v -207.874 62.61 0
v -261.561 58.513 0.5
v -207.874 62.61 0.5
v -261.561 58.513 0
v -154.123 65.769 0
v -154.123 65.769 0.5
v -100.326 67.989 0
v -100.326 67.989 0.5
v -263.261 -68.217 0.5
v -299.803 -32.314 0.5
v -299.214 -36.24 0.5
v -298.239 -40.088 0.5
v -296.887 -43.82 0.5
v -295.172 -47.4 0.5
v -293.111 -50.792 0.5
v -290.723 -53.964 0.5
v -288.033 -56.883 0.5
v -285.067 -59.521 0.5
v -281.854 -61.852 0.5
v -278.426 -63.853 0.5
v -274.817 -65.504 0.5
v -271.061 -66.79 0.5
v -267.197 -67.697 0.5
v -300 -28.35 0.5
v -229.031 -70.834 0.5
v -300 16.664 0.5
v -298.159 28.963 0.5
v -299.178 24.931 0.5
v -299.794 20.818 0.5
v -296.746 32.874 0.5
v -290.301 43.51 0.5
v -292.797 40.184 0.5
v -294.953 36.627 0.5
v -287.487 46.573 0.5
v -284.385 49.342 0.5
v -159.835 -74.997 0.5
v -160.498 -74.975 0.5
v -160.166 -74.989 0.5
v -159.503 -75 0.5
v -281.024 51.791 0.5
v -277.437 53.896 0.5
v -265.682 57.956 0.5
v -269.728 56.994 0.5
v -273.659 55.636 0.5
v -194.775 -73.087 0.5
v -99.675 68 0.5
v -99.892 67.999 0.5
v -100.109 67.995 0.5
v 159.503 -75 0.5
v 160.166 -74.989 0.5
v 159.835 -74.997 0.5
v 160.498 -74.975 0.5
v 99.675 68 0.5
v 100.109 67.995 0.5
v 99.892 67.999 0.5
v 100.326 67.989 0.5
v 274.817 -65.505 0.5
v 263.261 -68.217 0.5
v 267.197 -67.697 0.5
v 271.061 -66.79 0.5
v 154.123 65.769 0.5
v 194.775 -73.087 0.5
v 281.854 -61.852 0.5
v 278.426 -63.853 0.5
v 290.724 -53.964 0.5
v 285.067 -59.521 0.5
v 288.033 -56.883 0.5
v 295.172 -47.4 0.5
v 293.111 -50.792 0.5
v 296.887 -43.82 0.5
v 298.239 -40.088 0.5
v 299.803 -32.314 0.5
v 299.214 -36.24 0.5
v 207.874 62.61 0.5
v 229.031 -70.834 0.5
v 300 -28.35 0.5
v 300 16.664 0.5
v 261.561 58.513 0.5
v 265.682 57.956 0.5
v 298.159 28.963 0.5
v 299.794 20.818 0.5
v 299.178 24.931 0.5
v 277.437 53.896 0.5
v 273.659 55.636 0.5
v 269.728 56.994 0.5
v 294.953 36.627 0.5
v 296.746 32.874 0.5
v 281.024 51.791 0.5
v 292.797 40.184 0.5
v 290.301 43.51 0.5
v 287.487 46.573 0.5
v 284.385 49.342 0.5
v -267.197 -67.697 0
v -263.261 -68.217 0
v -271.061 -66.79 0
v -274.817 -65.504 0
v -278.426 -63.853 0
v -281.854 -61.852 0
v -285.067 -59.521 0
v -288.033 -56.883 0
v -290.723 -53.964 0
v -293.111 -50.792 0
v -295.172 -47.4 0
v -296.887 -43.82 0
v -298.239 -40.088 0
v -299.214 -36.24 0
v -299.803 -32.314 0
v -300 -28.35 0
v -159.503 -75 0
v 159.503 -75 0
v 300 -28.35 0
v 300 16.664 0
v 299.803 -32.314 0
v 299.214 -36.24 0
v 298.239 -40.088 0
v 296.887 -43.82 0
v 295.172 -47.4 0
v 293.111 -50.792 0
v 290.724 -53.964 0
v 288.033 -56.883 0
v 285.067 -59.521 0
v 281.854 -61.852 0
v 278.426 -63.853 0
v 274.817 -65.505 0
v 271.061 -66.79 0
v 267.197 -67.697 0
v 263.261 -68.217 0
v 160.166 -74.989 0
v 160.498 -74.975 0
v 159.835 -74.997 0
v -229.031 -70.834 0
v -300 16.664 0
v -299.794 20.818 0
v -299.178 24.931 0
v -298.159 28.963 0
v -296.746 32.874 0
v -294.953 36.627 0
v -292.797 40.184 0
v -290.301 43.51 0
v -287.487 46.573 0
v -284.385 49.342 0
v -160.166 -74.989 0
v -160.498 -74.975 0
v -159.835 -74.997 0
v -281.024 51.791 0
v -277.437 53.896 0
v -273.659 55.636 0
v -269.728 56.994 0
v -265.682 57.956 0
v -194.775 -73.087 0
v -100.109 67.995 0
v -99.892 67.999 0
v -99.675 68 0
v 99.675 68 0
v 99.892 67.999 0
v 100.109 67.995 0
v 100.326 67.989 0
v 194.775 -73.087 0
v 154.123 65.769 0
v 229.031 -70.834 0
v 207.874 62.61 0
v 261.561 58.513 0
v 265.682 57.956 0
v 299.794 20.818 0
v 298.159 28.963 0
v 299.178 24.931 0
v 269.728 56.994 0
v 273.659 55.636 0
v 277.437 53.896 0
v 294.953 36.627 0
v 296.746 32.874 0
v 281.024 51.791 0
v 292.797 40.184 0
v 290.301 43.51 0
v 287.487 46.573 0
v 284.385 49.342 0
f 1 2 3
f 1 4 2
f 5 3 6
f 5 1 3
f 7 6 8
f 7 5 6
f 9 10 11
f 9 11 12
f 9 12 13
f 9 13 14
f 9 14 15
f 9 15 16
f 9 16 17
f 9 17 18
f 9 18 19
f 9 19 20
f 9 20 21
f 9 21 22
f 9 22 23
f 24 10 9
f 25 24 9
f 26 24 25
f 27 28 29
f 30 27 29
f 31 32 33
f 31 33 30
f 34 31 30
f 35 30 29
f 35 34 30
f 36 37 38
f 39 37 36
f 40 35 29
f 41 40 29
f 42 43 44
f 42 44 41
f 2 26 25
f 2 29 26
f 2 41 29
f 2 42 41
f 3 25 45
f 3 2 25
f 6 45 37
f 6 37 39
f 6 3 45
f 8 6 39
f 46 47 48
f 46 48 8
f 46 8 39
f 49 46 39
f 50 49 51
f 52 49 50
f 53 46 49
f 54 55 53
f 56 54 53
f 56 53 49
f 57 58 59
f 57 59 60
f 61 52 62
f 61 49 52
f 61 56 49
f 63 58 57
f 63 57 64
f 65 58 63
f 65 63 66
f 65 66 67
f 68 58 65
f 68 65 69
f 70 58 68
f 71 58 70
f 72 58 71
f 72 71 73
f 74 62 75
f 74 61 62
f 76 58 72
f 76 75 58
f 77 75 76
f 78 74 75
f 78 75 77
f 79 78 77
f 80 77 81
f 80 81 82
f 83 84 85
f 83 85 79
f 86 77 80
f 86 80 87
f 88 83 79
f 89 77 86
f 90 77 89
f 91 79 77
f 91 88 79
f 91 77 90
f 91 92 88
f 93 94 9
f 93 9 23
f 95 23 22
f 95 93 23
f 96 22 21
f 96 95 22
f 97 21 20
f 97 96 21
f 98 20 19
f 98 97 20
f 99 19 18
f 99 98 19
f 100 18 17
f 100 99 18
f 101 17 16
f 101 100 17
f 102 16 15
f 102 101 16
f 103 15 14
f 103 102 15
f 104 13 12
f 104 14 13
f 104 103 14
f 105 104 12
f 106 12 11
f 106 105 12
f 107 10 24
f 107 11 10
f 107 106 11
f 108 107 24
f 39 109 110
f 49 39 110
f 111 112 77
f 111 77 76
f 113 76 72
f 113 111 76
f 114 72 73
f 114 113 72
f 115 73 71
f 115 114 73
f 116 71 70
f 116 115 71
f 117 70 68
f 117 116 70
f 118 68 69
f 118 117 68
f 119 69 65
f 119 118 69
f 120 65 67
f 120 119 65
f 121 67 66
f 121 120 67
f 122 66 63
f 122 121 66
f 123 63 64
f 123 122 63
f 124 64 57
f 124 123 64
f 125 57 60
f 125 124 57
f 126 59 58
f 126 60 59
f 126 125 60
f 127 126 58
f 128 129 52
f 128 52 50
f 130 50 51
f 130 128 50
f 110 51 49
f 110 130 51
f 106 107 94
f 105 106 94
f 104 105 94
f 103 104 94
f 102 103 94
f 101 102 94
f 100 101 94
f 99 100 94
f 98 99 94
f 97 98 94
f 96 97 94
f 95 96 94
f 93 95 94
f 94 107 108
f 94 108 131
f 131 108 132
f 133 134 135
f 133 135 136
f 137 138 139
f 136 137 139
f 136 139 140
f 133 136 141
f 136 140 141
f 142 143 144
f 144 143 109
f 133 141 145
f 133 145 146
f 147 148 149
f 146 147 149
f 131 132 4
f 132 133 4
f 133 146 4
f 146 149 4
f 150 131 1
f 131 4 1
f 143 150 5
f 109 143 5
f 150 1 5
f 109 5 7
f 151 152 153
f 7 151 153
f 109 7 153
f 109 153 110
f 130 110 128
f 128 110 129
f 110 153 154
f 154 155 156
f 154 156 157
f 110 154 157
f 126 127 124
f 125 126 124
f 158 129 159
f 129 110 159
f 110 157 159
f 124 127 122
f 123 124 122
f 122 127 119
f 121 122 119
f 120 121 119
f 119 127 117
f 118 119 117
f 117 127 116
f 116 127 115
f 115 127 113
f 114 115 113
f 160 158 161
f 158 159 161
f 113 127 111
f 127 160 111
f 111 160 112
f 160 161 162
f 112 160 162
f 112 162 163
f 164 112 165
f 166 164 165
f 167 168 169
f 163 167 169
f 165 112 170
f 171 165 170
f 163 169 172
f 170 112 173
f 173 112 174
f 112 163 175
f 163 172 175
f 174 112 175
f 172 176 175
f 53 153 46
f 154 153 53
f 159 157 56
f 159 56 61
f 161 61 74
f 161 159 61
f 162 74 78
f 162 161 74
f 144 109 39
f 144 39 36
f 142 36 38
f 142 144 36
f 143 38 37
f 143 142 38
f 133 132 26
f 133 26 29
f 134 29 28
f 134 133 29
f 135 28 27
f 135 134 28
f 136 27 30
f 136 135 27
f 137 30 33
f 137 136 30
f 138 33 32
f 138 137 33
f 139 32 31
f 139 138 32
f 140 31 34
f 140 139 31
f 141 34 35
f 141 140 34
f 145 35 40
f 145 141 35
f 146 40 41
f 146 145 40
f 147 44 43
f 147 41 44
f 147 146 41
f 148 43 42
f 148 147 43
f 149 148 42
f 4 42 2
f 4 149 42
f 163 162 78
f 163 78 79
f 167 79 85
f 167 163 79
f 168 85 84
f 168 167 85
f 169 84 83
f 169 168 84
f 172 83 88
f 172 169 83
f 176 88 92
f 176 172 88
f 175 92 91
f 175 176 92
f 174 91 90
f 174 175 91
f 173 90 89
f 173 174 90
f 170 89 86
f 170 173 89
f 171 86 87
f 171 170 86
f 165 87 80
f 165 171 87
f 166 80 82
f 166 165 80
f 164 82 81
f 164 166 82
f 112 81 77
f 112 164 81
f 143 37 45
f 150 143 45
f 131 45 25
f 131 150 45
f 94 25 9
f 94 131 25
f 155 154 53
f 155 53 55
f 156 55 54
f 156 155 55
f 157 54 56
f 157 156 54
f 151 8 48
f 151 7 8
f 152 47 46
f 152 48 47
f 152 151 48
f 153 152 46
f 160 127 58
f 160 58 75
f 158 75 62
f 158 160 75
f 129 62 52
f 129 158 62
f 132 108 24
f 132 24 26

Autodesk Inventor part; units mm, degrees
ref_plane "YZ Plane" through (0, 0, 0) normal (1, 0, 0) x (0, 1, 0)
ref_plane "XZ Plane" through (0, 0, 0) normal (0, 1, 0) x (-1, 0, 0)
ref_plane "XY Plane" through (0, 0, 0) normal (0, 0, 1) x (1, 0, 0)
sketch "Clock Front Face Outline" plane through (0, 0, 0) normal (0, 0, 1) x (1, 0, 0)
  arc A0 (261.5609, 58.5131) -> (100.3256, 67.9894) centre (0, -3015.4231) ccw
  arc A1 (-100.3256, 67.9894) -> (-261.5609, 58.5131) centre (0, -3015.4231) ccw
  line L0 (-159.5034, -75) -> (159.5034, -75)
  arc A2 (-263.2612, -68.2167) -> (-160.4975, -74.9753) centre (0, 3150) ccw
  arc A3 (160.4975, -74.9753) -> (263.2612, -68.2167) centre (0, 3150) ccw
  arc A4 (300, 16.6643) -> (261.5609, 58.5131) centre (258, 16.6643) ccw
  arc A5 (263.2612, -68.2167) -> (300, -28.3498) centre (260, -28.3498) ccw
  arc A6 (-300, -28.3498) -> (-263.2612, -68.2167) centre (-260, -28.3498) ccw
  arc A7 (-261.5609, 58.5131) -> (-300, 16.6643) centre (-258, 16.6643) ccw
  arc A8 (-99.6752, 68) -> (-100.3256, 67.9894) centre (-99.6752, 48) ccw
  arc A9 (100.3256, 67.9894) -> (99.6752, 68) centre (99.6752, 48) ccw
  arc A10 (159.5034, -75) -> (160.4975, -74.9753) centre (159.5034, -55) ccw
  arc A11 (-160.4975, -74.9753) -> (-159.5034, -75) centre (-159.5034, -55) ccw
  line L1 (-99.6752, 68) -> (99.6752, 68)
  line L2 (300, 16.6643) -> (300, -28.3498)
  line L3 (-300, -28.3498) -> (-300, 16.6643)
  point P0 (0, -2.2582)
  point P1 (-300, 55)
  point P2 (300, 55)
  point P3 (-300, -65)
  point P4 (300, -65)
  point P5 (-160, -75)
  point P6 (160, -75)
  point P7 (-100, 68)
  point P8 (100, 68)
  dimension "d0" = 600
  dimension "d1" = 120
  dimension "d2" = 120
  dimension "d3" = 140
  dimension "d4" = 140
  dimension "d5" = 200
  dimension "d6" = 200
  dimension "d7" = 200
  dimension "d8" = 320
  dimension "d9" = 143
  dimension "d10" = 10
  dimension "d11" = 10
  dimension "d12" = 13
  dimension "d13" = 13
  dimension "d14" = 42
  dimension "d15" = 40
  dimension "d16" = 40
  dimension "d17" = 42
  dimension "d18" = 20
sketch "Sketch1" plane through (0, 0, 0) normal (0, 0, 1) x (1, 0, 0)
  arc A0 (261.5609, 58.5131) -> (100.3256, 67.9894) centre (0, -3015.4231) ccw
  arc A1 (-100.3256, 67.9894) -> (-261.5609, 58.5131) centre (0, -3015.4231) ccw
  line L0 (-159.5034, -75) -> (159.5034, -75)
  arc A2 (-263.2612, -68.2167) -> (-160.4975, -74.9753) centre (0, 3150) ccw
  arc A3 (160.4975, -74.9753) -> (263.2612, -68.2167) centre (0, 3150) ccw
  arc A4 (300, 16.6643) -> (261.5609, 58.5131) centre (258, 16.6643) ccw
  arc A5 (263.2612, -68.2167) -> (300, -28.3498) centre (260, -28.3498) ccw
  arc A6 (-300, -28.3498) -> (-263.2612, -68.2167) centre (-260, -28.3498) ccw
  arc A7 (-261.5609, 58.5131) -> (-300, 16.6643) centre (-258, 16.6643) ccw
  arc A8 (-99.6752, 68) -> (-100.3256, 67.9894) centre (-99.6752, 48) ccw
  arc A9 (100.3256, 67.9894) -> (99.6752, 68) centre (99.6752, 48) ccw
  arc A10 (159.5034, -75) -> (160.4975, -74.9753) centre (159.5034, -55) ccw
  arc A11 (-160.4975, -74.9753) -> (-159.5034, -75) centre (-159.5034, -55) ccw
  line L1 (-99.6752, 68) -> (99.6752, 68)
  line L2 (300, 16.6643) -> (300, -28.3498)
  line L3 (-300, -28.3498) -> (-300, 16.6643)
  point P0 (0, 0)
  point P1 (0, 0)
  dimension "d19" = 300
  dimension "d20" = 75
extrude "Extrusion1" add sketch "Sketch1" along normal blind 0.5
properties part number "7 Segment Clock Blanking Plate" material "PMMA PlasticBlack"
